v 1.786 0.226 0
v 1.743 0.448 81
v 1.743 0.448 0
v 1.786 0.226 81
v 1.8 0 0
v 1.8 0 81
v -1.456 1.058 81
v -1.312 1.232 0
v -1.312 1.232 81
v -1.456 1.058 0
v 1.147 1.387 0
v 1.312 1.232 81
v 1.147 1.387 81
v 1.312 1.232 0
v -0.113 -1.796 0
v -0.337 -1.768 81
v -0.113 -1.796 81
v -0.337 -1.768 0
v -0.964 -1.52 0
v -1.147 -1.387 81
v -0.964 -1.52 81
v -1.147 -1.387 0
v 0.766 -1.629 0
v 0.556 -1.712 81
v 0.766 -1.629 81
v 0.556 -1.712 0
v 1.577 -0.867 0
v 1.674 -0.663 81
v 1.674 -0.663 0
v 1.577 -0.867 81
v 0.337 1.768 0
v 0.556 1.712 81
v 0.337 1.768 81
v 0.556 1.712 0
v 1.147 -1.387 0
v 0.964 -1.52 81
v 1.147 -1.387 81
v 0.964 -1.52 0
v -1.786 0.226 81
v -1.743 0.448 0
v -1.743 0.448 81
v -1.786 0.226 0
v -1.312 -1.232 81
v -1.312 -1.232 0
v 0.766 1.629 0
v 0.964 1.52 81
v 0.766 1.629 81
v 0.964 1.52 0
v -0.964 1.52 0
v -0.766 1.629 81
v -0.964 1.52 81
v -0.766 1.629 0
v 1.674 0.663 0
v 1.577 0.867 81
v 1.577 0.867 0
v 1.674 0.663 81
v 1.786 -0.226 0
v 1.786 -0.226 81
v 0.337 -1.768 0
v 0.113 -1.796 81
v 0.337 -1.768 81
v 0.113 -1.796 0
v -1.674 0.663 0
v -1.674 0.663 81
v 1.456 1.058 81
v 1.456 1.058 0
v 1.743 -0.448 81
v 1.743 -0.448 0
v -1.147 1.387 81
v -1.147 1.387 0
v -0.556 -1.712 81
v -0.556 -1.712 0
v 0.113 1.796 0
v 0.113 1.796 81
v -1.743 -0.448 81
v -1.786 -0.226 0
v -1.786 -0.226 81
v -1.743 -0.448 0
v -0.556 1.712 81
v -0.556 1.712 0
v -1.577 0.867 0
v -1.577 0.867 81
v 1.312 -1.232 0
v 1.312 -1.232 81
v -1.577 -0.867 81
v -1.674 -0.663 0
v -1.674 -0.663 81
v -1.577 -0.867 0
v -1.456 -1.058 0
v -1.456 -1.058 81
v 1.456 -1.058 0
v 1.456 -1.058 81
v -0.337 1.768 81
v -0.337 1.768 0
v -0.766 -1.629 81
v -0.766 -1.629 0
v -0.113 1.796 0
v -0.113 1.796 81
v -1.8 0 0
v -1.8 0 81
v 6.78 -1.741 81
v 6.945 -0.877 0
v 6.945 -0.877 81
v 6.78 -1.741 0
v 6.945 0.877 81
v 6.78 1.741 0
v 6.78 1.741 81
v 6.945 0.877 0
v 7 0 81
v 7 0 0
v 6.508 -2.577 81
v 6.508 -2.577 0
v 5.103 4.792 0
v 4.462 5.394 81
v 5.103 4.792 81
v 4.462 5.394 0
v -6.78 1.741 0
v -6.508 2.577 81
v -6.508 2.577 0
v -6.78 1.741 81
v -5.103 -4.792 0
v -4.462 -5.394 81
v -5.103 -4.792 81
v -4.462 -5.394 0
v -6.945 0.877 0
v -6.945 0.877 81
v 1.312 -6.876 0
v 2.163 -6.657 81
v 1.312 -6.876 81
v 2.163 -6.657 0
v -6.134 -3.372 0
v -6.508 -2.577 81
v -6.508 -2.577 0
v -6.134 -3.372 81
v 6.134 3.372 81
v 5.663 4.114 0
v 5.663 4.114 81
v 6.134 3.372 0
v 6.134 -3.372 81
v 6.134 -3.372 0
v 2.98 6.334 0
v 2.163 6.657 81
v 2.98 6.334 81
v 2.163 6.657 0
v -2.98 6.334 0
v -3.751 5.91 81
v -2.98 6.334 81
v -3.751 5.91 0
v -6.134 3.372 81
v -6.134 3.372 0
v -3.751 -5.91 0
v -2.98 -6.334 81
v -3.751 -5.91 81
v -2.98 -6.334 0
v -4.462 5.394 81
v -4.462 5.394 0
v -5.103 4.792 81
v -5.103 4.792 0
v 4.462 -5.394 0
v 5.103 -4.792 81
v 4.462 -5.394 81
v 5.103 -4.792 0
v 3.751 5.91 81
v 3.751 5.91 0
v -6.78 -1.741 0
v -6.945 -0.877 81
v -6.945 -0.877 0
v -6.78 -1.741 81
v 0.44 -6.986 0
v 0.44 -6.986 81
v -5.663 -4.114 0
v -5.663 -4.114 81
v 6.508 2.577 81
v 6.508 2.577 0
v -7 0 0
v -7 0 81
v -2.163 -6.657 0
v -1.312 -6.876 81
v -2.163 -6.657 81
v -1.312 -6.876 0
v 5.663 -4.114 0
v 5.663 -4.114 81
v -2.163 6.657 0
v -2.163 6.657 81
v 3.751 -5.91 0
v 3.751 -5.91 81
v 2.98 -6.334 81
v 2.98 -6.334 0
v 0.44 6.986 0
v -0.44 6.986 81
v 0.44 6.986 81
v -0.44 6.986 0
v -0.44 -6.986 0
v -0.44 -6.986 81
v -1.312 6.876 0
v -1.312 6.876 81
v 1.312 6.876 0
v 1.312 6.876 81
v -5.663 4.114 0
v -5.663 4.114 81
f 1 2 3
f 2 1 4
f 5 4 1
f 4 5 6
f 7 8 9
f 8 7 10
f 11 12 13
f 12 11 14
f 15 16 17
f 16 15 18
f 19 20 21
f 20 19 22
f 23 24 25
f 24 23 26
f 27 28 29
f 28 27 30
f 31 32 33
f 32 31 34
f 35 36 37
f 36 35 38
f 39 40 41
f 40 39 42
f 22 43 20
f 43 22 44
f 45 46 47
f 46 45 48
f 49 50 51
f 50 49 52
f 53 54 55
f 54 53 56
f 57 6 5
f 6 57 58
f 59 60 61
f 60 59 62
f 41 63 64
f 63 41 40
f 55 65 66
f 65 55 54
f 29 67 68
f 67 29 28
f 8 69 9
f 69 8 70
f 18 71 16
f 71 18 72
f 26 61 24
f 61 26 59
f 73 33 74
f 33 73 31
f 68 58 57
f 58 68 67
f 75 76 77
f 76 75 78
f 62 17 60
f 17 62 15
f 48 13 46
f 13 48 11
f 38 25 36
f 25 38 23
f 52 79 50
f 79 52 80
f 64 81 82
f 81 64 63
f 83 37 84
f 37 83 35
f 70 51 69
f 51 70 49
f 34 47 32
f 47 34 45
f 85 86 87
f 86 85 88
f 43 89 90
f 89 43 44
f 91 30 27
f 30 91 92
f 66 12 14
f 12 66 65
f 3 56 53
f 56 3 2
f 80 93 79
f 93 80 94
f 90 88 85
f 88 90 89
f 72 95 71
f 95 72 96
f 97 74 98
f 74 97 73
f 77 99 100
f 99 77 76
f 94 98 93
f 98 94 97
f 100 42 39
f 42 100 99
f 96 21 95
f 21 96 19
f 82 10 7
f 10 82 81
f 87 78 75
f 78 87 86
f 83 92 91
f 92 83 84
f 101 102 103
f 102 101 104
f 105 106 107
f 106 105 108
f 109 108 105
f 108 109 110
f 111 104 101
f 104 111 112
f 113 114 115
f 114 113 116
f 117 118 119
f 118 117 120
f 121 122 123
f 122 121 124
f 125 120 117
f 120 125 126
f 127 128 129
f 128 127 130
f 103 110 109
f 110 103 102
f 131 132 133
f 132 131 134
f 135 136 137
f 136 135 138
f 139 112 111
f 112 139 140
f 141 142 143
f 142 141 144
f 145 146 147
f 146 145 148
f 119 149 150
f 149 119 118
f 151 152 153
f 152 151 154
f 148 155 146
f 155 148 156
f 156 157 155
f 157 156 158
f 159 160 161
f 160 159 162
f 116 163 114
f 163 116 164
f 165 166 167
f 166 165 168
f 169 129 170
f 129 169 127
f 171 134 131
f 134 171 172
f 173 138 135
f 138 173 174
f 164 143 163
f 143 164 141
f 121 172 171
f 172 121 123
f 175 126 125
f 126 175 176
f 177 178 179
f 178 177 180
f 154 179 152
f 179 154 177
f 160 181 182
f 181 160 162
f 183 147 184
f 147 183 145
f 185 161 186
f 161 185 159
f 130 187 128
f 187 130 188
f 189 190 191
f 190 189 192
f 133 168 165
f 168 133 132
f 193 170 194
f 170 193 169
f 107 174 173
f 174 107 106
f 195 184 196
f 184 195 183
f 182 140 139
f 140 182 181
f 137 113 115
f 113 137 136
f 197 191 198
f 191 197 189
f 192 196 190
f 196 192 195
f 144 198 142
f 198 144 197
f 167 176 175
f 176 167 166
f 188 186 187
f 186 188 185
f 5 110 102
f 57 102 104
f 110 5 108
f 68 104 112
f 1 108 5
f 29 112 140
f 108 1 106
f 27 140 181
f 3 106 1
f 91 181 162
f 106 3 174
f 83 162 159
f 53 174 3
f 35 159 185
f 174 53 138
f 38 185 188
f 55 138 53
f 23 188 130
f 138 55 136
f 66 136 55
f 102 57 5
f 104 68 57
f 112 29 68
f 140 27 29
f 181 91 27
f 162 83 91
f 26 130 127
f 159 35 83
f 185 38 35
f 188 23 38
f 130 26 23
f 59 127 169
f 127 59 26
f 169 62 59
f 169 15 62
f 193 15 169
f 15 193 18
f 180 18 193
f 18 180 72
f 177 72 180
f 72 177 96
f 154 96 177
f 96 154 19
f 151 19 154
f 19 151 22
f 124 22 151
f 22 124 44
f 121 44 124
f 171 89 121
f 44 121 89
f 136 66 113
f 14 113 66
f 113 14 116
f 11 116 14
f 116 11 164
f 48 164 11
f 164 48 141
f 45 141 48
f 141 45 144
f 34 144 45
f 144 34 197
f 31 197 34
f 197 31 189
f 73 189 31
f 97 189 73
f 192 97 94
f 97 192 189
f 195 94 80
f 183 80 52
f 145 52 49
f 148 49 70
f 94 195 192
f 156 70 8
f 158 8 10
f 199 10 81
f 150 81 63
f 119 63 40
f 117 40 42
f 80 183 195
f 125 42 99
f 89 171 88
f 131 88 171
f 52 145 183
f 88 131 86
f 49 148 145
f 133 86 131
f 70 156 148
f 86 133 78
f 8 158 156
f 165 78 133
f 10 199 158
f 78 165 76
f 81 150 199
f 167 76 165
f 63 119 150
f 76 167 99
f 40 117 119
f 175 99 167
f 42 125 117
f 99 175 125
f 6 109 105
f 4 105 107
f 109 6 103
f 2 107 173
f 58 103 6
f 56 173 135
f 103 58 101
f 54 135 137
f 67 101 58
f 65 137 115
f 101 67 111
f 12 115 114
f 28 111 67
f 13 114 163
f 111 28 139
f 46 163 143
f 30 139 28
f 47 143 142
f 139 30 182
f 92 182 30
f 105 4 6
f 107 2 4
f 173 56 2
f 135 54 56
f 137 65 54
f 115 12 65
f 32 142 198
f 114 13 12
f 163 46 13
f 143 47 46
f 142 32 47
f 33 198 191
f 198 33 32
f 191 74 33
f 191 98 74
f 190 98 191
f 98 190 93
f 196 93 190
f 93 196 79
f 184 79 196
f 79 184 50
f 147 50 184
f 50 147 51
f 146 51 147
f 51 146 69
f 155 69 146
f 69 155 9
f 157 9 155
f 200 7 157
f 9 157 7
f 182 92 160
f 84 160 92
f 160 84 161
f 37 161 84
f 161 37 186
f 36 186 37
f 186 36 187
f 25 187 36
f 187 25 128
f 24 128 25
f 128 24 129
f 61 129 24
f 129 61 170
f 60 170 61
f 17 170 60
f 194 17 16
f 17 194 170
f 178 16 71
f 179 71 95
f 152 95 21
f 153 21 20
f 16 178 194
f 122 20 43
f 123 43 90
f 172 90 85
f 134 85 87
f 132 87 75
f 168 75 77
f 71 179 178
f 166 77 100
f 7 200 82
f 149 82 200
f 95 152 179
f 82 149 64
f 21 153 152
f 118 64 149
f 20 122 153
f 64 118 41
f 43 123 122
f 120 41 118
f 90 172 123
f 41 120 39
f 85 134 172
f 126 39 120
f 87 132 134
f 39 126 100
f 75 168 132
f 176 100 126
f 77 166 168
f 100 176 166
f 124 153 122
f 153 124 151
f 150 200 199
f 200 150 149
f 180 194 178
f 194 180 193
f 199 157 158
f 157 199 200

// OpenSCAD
$fn = 50;


difference() {
	union() {
		cylinder(h = 81, r = 7.0000000000);
	}
	union() {
		translate(v = [0.0000000000, 0.0000000000, -100.0000000000]) {
			cylinder(h = 200, r = 1.8000000000);
		}
		cylinder(h = 81, r = 1.8000000000);
		cylinder(h = 81, r = 1.8000000000);
		cylinder(h = 81, r = 1.8000000000);
	}
}
